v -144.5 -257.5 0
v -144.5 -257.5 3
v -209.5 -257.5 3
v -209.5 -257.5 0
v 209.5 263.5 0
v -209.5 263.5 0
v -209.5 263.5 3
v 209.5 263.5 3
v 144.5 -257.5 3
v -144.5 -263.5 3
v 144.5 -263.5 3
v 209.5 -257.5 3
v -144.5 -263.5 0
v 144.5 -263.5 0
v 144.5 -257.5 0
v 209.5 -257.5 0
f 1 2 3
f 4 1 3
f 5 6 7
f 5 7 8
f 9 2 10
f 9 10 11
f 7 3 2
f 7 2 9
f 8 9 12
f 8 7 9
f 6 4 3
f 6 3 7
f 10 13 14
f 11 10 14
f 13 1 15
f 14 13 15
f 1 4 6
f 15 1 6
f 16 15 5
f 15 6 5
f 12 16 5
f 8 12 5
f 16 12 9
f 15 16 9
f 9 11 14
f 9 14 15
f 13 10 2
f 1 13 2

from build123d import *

# Parameters (mm, degrees)
SKETCH_1_W          = 419
SKETCH_1_H          = 527
EXTRUDE_1_DEPTH     = 3
SKETCH_3_W          = 65
SKETCH_3_H          = 6
CUT_EXTRUDE_5_DEPTH = 3


with BuildPart() as part:
    # Эскиз1 → Бобышка-Вытянуть1 (new body)
    with BuildSketch(Plane.XY):
        Rectangle(SKETCH_1_W, SKETCH_1_H)
    extrude(amount=EXTRUDE_1_DEPTH)

    # Эскиз3 → Вырез-Вытянуть5 (cut)
    with BuildSketch(Plane(origin=(0, 0, 3), x_dir=(-1, 0, 0), z_dir=(0, 0, -1))):
        with Locations((-177, -260.5)):
            Rectangle(SKETCH_3_W, SKETCH_3_H)
        with Locations((177, -260.5)):
            Rectangle(SKETCH_3_W, SKETCH_3_H)
    extrude(amount=CUT_EXTRUDE_5_DEPTH, mode=Mode.SUBTRACT)


solid = part.part
